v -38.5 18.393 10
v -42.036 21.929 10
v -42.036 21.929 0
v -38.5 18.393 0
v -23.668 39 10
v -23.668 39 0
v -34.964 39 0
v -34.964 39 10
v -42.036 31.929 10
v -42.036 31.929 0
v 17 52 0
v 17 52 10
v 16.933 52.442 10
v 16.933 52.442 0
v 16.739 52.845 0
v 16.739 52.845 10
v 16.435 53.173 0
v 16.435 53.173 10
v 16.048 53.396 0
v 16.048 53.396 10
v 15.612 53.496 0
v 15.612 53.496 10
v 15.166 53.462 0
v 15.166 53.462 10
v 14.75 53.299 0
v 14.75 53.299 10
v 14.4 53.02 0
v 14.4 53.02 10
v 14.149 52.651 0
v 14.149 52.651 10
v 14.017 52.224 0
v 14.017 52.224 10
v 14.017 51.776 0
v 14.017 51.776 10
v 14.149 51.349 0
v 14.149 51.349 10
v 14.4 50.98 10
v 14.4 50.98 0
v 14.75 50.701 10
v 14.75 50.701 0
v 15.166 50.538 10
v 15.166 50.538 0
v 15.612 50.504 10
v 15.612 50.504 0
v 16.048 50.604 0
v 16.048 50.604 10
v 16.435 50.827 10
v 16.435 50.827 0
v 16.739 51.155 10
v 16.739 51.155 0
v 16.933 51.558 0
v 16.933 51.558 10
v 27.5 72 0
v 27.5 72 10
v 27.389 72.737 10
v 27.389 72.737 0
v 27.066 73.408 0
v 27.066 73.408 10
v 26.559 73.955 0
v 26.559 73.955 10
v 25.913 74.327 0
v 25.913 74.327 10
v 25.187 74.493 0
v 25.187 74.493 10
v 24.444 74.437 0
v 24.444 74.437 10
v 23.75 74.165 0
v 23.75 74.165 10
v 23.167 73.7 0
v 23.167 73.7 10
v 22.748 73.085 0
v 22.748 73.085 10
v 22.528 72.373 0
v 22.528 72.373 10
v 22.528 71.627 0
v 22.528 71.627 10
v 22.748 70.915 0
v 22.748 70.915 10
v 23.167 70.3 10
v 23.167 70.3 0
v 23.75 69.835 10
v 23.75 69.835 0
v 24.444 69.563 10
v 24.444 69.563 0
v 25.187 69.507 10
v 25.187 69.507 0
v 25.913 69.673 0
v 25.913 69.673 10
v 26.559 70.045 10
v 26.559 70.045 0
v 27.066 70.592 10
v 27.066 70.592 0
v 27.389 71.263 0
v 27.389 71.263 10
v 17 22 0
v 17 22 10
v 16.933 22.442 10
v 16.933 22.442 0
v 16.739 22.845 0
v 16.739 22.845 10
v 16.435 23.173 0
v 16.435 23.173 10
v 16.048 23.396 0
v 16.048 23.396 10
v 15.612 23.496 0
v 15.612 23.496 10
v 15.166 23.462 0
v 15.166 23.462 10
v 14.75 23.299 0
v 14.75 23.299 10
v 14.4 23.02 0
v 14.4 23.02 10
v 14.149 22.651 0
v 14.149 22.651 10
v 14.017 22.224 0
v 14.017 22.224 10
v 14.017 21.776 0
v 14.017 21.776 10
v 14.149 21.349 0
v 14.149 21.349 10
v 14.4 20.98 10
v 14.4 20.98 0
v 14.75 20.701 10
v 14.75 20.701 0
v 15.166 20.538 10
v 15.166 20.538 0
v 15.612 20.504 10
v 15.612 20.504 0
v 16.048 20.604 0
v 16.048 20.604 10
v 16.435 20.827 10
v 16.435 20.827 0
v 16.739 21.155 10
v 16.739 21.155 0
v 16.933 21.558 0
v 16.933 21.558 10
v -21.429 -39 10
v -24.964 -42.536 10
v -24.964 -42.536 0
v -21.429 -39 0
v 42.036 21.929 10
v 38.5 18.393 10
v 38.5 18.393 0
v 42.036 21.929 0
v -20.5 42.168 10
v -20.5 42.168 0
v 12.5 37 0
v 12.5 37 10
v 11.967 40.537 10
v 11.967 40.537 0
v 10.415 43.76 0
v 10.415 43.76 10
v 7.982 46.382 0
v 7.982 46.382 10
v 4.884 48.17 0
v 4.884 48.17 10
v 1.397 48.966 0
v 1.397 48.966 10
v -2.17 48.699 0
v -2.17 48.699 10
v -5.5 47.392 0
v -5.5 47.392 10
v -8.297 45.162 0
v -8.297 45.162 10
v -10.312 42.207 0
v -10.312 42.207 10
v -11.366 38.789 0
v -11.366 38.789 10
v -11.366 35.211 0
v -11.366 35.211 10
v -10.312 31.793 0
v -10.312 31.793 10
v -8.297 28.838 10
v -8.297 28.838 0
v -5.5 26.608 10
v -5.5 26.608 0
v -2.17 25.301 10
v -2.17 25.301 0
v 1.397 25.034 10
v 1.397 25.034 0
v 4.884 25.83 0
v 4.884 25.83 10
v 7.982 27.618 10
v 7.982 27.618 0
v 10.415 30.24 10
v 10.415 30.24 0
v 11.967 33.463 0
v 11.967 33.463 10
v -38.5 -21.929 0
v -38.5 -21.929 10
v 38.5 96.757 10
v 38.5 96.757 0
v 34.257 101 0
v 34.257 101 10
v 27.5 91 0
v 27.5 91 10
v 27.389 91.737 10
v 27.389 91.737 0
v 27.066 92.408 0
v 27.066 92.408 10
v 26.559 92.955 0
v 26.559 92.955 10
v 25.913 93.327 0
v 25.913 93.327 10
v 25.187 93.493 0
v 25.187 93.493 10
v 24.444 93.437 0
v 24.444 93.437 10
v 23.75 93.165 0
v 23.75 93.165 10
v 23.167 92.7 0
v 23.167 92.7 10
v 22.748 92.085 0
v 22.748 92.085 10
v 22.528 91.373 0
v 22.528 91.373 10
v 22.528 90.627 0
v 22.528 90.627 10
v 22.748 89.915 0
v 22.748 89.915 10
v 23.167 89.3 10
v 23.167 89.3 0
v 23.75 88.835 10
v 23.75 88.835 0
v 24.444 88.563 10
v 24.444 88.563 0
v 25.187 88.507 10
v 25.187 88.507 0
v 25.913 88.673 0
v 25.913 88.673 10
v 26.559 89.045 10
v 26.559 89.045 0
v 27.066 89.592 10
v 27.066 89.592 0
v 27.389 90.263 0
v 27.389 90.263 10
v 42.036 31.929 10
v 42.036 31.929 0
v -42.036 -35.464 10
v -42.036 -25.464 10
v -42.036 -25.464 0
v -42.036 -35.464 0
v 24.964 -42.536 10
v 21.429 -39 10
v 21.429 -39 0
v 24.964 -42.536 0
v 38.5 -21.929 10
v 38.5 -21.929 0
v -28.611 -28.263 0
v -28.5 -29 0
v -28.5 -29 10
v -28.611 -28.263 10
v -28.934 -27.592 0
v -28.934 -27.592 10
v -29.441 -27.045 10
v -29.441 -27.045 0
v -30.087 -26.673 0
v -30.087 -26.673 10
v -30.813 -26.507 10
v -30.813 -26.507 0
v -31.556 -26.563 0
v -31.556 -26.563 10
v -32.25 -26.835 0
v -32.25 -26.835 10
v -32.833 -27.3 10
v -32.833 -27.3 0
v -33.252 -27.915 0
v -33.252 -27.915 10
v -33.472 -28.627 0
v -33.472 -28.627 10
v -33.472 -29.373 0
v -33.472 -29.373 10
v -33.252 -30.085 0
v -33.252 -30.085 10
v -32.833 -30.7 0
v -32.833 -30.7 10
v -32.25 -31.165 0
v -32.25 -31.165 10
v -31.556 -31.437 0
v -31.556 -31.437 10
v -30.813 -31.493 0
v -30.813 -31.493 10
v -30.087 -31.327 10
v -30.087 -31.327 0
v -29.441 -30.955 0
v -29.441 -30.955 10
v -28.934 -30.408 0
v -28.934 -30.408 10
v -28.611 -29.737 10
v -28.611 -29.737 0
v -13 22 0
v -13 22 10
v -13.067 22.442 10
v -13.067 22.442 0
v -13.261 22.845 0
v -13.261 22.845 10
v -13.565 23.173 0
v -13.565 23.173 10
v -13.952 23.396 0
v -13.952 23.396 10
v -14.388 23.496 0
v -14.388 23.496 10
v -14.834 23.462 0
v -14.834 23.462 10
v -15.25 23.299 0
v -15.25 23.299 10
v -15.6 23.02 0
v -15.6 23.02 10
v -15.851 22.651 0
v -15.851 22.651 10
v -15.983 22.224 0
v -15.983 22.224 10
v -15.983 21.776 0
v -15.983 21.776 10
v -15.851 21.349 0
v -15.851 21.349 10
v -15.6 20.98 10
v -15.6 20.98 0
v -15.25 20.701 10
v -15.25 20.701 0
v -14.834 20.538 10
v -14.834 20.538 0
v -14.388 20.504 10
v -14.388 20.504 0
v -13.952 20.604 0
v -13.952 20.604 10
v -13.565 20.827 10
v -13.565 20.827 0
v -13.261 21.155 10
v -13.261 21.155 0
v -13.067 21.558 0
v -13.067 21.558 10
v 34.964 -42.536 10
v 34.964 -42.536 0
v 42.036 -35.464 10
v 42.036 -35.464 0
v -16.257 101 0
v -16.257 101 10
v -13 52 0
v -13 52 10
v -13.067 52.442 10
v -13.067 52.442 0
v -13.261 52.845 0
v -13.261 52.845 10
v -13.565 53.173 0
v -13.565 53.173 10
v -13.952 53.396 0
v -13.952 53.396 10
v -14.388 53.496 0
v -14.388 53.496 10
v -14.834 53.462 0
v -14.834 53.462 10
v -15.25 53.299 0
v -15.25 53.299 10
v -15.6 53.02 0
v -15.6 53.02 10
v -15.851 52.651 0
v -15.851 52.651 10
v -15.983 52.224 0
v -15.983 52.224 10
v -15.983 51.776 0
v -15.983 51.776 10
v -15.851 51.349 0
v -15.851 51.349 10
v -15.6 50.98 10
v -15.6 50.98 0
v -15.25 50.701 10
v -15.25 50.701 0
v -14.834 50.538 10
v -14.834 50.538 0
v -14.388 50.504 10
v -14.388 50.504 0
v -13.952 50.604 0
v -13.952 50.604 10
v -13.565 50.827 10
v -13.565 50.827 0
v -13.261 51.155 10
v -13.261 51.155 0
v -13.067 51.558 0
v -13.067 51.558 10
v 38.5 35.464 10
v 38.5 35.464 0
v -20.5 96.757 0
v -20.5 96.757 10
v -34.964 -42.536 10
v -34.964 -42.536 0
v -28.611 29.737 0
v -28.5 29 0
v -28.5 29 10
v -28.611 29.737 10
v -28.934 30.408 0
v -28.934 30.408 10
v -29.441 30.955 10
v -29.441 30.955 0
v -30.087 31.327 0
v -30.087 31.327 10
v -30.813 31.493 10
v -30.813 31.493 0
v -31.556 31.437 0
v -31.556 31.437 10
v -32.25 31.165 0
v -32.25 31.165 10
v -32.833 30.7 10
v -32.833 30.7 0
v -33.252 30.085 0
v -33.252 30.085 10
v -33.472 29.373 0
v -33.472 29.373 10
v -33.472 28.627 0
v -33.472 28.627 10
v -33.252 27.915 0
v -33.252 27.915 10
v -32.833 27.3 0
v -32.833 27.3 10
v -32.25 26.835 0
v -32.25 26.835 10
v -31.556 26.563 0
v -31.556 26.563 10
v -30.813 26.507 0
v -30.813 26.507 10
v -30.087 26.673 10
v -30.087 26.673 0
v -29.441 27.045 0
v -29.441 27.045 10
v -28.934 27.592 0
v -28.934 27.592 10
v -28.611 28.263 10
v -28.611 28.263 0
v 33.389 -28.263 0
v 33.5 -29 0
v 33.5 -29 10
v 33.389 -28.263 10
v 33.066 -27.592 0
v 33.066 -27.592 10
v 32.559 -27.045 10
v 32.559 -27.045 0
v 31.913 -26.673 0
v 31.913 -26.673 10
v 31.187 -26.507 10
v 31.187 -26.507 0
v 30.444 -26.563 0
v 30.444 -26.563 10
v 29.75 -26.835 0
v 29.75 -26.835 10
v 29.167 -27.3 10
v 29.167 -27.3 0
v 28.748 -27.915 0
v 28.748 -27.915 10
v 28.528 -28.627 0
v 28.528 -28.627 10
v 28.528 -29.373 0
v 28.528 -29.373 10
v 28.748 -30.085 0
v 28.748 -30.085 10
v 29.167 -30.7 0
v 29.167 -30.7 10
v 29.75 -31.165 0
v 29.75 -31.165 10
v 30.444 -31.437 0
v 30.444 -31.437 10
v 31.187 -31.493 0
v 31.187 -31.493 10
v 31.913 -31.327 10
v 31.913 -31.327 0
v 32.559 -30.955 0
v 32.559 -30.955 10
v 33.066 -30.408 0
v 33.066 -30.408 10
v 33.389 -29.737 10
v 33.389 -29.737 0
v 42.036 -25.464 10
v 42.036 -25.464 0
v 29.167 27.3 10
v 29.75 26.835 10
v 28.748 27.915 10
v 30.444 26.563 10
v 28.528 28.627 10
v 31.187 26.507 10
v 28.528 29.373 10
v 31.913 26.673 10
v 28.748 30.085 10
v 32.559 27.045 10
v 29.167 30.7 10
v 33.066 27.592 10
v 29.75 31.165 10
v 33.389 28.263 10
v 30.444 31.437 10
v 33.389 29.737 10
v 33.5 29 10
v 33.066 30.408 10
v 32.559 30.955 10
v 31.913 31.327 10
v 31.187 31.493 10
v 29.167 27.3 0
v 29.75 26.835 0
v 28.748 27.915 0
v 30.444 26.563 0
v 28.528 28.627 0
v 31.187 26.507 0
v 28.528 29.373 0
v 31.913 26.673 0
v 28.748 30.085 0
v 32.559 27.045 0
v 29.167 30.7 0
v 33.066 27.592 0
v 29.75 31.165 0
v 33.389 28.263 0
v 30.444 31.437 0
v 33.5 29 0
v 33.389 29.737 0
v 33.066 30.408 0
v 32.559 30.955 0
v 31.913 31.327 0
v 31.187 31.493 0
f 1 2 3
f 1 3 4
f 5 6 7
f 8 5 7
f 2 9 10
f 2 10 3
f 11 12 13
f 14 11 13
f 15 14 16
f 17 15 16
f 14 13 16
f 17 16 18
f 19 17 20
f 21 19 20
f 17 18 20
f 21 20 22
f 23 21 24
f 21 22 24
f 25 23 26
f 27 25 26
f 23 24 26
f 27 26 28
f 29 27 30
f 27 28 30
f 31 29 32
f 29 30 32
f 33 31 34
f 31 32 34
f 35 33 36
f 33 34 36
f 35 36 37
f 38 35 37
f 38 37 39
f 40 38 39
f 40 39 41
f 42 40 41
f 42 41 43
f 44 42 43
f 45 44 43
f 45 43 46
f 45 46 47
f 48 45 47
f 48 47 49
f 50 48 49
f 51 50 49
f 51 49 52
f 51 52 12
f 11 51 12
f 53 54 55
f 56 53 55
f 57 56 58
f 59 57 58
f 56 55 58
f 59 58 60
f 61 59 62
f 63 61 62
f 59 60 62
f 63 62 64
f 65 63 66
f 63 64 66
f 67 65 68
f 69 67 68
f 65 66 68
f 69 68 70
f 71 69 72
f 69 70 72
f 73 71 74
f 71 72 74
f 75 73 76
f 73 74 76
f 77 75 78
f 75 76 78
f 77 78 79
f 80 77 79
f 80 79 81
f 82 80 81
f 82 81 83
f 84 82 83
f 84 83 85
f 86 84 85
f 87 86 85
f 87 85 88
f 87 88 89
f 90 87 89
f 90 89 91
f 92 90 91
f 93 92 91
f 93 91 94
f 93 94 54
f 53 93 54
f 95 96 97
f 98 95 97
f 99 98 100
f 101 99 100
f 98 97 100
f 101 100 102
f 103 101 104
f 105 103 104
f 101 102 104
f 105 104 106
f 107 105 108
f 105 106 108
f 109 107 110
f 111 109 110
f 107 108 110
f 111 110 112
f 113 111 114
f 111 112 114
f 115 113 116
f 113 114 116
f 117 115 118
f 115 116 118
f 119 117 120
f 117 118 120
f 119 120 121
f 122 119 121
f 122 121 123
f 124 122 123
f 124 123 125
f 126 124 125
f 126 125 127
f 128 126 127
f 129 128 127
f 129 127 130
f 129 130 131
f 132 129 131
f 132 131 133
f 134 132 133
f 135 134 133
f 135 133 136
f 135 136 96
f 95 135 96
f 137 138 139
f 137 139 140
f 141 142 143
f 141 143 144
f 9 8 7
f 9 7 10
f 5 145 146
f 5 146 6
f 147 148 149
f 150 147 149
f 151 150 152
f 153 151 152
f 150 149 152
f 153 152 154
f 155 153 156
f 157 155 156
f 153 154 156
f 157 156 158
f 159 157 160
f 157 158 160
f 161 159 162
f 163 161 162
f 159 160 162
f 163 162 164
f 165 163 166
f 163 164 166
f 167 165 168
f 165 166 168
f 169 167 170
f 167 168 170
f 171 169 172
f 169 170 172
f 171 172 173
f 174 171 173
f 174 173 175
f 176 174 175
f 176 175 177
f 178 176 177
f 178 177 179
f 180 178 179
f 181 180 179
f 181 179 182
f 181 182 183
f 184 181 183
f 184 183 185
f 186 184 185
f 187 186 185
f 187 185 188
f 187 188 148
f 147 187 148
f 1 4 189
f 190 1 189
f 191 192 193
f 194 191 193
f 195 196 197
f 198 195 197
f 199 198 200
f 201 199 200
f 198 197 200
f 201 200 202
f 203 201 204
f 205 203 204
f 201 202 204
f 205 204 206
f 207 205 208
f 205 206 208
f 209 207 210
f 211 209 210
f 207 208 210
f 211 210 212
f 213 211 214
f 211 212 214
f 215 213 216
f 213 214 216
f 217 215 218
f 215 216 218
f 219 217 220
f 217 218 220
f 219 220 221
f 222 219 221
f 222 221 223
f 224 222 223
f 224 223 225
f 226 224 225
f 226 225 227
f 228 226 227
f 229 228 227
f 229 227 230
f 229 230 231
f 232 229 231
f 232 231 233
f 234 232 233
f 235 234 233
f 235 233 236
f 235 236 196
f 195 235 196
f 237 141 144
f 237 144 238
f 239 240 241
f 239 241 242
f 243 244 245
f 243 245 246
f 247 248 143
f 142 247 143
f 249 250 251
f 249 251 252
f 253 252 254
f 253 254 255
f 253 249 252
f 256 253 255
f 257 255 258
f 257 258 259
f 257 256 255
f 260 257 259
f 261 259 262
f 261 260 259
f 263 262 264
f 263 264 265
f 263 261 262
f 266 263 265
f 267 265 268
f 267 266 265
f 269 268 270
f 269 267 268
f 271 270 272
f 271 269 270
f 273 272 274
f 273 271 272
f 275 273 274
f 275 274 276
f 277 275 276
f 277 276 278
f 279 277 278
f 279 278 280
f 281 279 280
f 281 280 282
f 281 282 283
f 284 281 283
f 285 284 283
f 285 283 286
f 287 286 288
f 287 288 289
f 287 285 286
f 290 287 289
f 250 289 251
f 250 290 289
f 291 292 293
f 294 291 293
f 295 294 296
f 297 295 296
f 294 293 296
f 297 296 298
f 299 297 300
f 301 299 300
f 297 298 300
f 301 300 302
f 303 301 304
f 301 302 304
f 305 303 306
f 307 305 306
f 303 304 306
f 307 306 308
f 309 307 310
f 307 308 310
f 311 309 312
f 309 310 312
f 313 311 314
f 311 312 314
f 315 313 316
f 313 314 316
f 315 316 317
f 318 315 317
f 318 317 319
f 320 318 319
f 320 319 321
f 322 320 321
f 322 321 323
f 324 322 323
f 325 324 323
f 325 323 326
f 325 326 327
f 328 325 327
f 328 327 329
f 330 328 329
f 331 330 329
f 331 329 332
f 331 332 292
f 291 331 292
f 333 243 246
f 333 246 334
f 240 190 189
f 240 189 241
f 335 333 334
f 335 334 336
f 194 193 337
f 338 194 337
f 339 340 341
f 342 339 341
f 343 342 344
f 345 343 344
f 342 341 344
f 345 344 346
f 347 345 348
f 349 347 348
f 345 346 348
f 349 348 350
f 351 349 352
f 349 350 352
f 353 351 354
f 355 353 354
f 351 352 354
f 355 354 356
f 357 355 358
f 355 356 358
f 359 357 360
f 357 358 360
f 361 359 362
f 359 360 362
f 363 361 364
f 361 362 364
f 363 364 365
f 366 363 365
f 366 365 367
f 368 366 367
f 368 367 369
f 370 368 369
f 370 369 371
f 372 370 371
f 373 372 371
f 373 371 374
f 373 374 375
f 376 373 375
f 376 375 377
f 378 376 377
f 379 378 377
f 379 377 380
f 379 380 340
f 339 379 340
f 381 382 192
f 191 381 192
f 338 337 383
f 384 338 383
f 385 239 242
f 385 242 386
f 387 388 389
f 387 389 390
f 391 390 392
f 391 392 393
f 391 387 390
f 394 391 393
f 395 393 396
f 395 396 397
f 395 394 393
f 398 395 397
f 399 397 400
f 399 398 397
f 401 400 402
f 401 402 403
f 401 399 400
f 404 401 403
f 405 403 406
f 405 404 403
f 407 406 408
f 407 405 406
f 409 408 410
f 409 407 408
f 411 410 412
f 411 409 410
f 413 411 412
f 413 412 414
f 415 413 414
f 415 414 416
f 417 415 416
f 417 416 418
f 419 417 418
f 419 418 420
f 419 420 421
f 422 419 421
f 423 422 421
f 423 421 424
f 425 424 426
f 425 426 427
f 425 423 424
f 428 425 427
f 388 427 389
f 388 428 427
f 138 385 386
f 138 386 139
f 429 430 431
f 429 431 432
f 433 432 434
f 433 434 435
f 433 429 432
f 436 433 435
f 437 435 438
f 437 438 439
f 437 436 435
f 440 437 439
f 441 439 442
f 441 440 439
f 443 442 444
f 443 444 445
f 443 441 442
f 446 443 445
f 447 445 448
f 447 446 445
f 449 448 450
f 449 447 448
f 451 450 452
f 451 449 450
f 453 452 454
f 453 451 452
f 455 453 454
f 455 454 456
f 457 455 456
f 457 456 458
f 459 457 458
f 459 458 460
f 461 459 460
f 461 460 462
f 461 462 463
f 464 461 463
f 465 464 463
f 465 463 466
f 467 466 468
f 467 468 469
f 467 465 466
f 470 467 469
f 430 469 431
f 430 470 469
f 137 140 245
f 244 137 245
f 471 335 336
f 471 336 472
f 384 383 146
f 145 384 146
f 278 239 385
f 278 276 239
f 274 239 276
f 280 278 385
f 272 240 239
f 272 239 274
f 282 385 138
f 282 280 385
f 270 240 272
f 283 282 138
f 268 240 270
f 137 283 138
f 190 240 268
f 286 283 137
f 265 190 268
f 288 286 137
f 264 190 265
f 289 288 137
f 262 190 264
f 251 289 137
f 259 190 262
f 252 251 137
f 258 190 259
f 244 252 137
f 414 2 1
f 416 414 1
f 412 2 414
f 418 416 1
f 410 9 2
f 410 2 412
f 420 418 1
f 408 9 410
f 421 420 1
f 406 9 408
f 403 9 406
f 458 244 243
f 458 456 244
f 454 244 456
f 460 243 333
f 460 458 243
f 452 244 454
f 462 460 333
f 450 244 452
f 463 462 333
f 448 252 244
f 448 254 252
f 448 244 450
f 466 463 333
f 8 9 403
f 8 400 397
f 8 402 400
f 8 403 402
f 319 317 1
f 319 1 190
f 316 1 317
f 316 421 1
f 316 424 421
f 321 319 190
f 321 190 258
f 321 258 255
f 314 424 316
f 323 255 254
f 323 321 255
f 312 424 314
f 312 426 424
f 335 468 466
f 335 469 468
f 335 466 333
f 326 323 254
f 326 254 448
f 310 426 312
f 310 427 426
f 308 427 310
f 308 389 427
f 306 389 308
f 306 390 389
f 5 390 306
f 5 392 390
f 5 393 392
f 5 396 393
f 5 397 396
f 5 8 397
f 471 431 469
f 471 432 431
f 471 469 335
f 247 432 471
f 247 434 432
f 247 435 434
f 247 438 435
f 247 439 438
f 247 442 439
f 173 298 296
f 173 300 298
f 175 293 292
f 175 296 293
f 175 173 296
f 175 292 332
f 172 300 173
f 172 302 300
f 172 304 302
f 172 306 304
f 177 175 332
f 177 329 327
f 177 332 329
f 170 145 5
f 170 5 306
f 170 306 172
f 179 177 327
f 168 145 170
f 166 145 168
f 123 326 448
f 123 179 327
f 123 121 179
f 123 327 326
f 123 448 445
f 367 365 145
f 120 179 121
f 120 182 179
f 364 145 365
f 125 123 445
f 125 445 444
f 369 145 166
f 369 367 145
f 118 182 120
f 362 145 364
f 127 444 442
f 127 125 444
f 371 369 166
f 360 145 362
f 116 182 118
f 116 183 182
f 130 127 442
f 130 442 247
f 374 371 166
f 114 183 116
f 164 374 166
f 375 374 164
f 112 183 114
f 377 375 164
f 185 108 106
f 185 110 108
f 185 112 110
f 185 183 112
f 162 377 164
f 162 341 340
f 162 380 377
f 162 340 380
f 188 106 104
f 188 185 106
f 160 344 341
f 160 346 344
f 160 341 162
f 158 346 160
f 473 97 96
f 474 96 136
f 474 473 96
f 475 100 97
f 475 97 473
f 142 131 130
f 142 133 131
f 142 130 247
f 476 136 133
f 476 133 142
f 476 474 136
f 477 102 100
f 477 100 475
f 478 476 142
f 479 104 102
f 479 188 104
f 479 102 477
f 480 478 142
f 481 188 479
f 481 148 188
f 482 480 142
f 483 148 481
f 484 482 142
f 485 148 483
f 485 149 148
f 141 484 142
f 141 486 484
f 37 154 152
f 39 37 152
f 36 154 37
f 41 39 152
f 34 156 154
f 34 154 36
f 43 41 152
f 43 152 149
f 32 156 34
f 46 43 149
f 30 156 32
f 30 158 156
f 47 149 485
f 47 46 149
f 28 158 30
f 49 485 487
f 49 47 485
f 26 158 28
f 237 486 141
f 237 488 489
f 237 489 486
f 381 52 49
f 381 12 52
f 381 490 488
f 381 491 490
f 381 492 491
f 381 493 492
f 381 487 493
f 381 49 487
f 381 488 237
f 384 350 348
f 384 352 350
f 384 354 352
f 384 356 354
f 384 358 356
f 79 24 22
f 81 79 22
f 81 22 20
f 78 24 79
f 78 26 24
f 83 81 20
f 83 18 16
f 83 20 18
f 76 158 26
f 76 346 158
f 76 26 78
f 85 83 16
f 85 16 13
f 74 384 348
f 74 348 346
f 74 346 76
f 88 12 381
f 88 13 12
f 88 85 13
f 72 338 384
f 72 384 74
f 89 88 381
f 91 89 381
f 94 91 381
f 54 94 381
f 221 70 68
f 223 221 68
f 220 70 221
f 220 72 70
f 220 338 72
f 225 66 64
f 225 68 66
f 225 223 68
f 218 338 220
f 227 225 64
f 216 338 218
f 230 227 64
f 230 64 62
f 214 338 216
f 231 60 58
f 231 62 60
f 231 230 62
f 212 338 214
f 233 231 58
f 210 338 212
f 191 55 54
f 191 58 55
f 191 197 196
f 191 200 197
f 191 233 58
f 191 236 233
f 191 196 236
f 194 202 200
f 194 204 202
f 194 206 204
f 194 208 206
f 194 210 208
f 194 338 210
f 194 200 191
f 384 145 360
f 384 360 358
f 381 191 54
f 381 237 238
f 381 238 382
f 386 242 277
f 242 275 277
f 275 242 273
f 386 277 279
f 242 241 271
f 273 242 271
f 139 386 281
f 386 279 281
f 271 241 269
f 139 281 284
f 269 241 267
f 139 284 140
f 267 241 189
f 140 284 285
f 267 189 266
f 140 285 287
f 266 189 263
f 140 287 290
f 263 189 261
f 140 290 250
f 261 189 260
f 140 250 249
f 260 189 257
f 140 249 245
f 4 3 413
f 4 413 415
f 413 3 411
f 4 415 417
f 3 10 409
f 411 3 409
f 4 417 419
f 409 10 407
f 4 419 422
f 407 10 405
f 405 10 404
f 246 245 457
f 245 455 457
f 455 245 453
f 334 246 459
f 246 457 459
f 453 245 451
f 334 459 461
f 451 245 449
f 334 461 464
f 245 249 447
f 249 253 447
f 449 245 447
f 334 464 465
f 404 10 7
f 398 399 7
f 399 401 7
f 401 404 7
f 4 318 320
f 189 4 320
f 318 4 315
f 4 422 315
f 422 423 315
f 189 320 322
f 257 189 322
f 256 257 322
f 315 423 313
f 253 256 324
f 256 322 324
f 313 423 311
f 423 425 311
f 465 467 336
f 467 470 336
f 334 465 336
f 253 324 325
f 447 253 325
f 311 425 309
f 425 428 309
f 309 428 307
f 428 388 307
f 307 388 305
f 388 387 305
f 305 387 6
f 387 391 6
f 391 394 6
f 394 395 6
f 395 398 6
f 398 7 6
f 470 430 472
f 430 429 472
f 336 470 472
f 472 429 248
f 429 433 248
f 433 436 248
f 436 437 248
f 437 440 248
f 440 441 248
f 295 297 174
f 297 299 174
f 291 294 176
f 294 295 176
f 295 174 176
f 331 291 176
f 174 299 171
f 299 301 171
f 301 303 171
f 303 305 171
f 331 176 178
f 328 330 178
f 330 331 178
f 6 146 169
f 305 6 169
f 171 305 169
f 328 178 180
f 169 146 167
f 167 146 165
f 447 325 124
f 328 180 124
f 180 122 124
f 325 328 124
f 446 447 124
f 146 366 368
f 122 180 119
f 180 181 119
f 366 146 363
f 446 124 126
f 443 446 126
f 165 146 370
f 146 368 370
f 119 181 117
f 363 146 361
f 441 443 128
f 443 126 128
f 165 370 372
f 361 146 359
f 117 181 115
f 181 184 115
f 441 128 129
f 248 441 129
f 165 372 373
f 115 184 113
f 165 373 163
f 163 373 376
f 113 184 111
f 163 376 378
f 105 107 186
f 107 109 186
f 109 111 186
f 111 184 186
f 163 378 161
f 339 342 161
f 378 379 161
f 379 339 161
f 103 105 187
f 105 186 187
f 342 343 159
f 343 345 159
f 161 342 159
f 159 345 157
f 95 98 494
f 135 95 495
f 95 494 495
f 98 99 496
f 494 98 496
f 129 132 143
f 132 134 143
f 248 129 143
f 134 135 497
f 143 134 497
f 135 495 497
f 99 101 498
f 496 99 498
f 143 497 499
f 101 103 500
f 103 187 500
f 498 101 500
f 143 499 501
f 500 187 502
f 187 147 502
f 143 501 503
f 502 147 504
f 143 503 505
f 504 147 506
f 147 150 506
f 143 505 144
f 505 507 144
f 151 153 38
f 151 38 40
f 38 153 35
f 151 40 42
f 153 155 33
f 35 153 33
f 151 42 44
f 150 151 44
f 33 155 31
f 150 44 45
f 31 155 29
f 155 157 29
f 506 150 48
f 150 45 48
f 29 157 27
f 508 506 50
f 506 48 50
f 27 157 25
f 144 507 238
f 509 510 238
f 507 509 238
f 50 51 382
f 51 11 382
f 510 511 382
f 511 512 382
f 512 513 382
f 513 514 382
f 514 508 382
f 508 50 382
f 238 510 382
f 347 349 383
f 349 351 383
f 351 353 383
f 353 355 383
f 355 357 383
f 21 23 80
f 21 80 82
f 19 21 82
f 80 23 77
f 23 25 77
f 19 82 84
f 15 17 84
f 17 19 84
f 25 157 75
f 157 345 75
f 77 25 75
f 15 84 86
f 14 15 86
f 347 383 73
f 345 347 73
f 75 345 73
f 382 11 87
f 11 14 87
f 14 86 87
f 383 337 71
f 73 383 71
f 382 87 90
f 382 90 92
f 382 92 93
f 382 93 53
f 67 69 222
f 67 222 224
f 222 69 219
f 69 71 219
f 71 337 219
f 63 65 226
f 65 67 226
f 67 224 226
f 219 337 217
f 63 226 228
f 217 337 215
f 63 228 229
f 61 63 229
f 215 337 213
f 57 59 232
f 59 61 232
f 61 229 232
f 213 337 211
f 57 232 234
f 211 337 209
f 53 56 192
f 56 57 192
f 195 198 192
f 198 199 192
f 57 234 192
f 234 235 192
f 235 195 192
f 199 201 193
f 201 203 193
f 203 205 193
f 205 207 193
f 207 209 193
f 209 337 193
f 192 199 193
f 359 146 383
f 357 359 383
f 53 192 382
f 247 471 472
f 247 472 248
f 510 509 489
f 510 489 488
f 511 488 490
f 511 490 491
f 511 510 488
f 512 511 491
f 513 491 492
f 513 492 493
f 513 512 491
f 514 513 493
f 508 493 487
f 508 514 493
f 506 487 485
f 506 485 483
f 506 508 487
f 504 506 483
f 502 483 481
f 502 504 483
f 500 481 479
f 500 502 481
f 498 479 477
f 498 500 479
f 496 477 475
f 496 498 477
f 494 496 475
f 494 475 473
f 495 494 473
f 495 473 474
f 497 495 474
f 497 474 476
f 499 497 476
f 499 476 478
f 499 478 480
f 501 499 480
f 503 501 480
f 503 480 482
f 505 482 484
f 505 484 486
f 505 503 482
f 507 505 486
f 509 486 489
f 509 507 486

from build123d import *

# Parameters (mm, degrees)
CROQUIS1_R              = 2.5
SALIENTE_EXTRUIR1_DEPTH = 10
SALIENTE_EXTRUIR2_DEPTH = 10
CROQUIS10_R             = 2.5
CROQUIS10_R_2           = 12
CROQUIS10_R_3           = 1.5
CORTAR_EXTRUIR1_DEPTH   = 110.854385942


with BuildPart() as part:
    # Croquis1 → Saliente-Extruir1 (new body)
    with BuildSketch(Plane.XY):
        Polygon((-20.5, 39), (-38.5, 39), (-38.5, -39), (38.5, -39), (38.5, 96.757359313), (34.257359313, 101), (-16.257359313, 101), (-20.5, 96.757359313), align=None)
        with Locations((31, 29)):
            Circle(CROQUIS1_R, mode=Mode.SUBTRACT)
        with Locations((31, -29)):
            Circle(CROQUIS1_R, mode=Mode.SUBTRACT)
        with Locations((-31, -29)):
            Circle(CROQUIS1_R, mode=Mode.SUBTRACT)
        with Locations((-31, 29)):
            Circle(CROQUIS1_R, mode=Mode.SUBTRACT)
    extrude(amount=SALIENTE_EXTRUIR1_DEPTH)

    # Croquis9 → Saliente-Extruir2 (add, through all)
    with BuildSketch(Plane.XY.offset(10)):
        Polygon((-38.5, 35.464466094), (-38.5, 18.393398282), (-34.964466094, 39), align=None)
        Polygon((-42.035533906, 21.928932188), (-38.5, 18.393398282), (-38.5, 35.464466094), (-42.035533906, 31.928932188), align=None)
        Polygon((34.964466094, 39), (38.5, 18.393398282), (38.5, 35.464466094), align=None)
        Polygon((38.5, 35.464466094), (38.5, 18.393398282), (42.035533906, 21.928932188), (42.035533906, 31.928932188), align=None)
        Polygon((38.5, -21.928932188), (38.5, -30.464466094), (38.5, -39), (42.035533906, -35.464466094), (42.035533906, -25.464466094), align=None)
        Polygon((29.964466094, -39), (21.428932188, -39), (24.964466094, -42.535533906), (34.964466094, -42.535533906), (38.5, -39), align=None)
        Polygon((38.5, -30.464466094), (29.964466094, -39), (38.5, -39), align=None)
        Polygon((-38.5, -39), (-38.5, -30.464466094), (-38.5, -21.928932188), (-42.035533906, -25.464466094), (-42.035533906, -35.464466094), align=None)
        Polygon((-38.5, -39), (-29.964466094, -39), (-38.5, -30.464466094), align=None)
        Polygon((-24.964466094, -42.535533906), (-21.428932188, -39), (-29.964466094, -39), (-38.5, -39), (-34.964466094, -42.535533906), align=None)
        Polygon((-20.5, 42.168004936), (-23.668004936, 39), (-20.5, 39), align=None)
    extrude(amount=-SALIENTE_EXTRUIR2_DEPTH)

    # Croquis10 → Cortar-Extruir1 (cut, through all)
    with BuildSketch(Plane.XY.offset(10)):
        Polygon((-38.5, 39), (-38.5, 35.464466094), (-34.964466094, 39), align=None)
        with Locations((25, 72)):
            Circle(CROQUIS10_R)
        with Locations((25, 91)):
            Circle(CROQUIS10_R)
        with Locations((0.5, 37)):
            Circle(CROQUIS10_R_2)
        with Locations((-14.5, 52)):
            Circle(CROQUIS10_R_3)
        with Locations((15.5, 52)):
            Circle(CROQUIS10_R_3)
        with Locations((15.5, 22)):
            Circle(CROQUIS10_R_3)
        with Locations((-14.5, 22)):
            Circle(CROQUIS10_R_3)
    extrude(amount=-CORTAR_EXTRUIR1_DEPTH, mode=Mode.SUBTRACT)


solid = part.part
